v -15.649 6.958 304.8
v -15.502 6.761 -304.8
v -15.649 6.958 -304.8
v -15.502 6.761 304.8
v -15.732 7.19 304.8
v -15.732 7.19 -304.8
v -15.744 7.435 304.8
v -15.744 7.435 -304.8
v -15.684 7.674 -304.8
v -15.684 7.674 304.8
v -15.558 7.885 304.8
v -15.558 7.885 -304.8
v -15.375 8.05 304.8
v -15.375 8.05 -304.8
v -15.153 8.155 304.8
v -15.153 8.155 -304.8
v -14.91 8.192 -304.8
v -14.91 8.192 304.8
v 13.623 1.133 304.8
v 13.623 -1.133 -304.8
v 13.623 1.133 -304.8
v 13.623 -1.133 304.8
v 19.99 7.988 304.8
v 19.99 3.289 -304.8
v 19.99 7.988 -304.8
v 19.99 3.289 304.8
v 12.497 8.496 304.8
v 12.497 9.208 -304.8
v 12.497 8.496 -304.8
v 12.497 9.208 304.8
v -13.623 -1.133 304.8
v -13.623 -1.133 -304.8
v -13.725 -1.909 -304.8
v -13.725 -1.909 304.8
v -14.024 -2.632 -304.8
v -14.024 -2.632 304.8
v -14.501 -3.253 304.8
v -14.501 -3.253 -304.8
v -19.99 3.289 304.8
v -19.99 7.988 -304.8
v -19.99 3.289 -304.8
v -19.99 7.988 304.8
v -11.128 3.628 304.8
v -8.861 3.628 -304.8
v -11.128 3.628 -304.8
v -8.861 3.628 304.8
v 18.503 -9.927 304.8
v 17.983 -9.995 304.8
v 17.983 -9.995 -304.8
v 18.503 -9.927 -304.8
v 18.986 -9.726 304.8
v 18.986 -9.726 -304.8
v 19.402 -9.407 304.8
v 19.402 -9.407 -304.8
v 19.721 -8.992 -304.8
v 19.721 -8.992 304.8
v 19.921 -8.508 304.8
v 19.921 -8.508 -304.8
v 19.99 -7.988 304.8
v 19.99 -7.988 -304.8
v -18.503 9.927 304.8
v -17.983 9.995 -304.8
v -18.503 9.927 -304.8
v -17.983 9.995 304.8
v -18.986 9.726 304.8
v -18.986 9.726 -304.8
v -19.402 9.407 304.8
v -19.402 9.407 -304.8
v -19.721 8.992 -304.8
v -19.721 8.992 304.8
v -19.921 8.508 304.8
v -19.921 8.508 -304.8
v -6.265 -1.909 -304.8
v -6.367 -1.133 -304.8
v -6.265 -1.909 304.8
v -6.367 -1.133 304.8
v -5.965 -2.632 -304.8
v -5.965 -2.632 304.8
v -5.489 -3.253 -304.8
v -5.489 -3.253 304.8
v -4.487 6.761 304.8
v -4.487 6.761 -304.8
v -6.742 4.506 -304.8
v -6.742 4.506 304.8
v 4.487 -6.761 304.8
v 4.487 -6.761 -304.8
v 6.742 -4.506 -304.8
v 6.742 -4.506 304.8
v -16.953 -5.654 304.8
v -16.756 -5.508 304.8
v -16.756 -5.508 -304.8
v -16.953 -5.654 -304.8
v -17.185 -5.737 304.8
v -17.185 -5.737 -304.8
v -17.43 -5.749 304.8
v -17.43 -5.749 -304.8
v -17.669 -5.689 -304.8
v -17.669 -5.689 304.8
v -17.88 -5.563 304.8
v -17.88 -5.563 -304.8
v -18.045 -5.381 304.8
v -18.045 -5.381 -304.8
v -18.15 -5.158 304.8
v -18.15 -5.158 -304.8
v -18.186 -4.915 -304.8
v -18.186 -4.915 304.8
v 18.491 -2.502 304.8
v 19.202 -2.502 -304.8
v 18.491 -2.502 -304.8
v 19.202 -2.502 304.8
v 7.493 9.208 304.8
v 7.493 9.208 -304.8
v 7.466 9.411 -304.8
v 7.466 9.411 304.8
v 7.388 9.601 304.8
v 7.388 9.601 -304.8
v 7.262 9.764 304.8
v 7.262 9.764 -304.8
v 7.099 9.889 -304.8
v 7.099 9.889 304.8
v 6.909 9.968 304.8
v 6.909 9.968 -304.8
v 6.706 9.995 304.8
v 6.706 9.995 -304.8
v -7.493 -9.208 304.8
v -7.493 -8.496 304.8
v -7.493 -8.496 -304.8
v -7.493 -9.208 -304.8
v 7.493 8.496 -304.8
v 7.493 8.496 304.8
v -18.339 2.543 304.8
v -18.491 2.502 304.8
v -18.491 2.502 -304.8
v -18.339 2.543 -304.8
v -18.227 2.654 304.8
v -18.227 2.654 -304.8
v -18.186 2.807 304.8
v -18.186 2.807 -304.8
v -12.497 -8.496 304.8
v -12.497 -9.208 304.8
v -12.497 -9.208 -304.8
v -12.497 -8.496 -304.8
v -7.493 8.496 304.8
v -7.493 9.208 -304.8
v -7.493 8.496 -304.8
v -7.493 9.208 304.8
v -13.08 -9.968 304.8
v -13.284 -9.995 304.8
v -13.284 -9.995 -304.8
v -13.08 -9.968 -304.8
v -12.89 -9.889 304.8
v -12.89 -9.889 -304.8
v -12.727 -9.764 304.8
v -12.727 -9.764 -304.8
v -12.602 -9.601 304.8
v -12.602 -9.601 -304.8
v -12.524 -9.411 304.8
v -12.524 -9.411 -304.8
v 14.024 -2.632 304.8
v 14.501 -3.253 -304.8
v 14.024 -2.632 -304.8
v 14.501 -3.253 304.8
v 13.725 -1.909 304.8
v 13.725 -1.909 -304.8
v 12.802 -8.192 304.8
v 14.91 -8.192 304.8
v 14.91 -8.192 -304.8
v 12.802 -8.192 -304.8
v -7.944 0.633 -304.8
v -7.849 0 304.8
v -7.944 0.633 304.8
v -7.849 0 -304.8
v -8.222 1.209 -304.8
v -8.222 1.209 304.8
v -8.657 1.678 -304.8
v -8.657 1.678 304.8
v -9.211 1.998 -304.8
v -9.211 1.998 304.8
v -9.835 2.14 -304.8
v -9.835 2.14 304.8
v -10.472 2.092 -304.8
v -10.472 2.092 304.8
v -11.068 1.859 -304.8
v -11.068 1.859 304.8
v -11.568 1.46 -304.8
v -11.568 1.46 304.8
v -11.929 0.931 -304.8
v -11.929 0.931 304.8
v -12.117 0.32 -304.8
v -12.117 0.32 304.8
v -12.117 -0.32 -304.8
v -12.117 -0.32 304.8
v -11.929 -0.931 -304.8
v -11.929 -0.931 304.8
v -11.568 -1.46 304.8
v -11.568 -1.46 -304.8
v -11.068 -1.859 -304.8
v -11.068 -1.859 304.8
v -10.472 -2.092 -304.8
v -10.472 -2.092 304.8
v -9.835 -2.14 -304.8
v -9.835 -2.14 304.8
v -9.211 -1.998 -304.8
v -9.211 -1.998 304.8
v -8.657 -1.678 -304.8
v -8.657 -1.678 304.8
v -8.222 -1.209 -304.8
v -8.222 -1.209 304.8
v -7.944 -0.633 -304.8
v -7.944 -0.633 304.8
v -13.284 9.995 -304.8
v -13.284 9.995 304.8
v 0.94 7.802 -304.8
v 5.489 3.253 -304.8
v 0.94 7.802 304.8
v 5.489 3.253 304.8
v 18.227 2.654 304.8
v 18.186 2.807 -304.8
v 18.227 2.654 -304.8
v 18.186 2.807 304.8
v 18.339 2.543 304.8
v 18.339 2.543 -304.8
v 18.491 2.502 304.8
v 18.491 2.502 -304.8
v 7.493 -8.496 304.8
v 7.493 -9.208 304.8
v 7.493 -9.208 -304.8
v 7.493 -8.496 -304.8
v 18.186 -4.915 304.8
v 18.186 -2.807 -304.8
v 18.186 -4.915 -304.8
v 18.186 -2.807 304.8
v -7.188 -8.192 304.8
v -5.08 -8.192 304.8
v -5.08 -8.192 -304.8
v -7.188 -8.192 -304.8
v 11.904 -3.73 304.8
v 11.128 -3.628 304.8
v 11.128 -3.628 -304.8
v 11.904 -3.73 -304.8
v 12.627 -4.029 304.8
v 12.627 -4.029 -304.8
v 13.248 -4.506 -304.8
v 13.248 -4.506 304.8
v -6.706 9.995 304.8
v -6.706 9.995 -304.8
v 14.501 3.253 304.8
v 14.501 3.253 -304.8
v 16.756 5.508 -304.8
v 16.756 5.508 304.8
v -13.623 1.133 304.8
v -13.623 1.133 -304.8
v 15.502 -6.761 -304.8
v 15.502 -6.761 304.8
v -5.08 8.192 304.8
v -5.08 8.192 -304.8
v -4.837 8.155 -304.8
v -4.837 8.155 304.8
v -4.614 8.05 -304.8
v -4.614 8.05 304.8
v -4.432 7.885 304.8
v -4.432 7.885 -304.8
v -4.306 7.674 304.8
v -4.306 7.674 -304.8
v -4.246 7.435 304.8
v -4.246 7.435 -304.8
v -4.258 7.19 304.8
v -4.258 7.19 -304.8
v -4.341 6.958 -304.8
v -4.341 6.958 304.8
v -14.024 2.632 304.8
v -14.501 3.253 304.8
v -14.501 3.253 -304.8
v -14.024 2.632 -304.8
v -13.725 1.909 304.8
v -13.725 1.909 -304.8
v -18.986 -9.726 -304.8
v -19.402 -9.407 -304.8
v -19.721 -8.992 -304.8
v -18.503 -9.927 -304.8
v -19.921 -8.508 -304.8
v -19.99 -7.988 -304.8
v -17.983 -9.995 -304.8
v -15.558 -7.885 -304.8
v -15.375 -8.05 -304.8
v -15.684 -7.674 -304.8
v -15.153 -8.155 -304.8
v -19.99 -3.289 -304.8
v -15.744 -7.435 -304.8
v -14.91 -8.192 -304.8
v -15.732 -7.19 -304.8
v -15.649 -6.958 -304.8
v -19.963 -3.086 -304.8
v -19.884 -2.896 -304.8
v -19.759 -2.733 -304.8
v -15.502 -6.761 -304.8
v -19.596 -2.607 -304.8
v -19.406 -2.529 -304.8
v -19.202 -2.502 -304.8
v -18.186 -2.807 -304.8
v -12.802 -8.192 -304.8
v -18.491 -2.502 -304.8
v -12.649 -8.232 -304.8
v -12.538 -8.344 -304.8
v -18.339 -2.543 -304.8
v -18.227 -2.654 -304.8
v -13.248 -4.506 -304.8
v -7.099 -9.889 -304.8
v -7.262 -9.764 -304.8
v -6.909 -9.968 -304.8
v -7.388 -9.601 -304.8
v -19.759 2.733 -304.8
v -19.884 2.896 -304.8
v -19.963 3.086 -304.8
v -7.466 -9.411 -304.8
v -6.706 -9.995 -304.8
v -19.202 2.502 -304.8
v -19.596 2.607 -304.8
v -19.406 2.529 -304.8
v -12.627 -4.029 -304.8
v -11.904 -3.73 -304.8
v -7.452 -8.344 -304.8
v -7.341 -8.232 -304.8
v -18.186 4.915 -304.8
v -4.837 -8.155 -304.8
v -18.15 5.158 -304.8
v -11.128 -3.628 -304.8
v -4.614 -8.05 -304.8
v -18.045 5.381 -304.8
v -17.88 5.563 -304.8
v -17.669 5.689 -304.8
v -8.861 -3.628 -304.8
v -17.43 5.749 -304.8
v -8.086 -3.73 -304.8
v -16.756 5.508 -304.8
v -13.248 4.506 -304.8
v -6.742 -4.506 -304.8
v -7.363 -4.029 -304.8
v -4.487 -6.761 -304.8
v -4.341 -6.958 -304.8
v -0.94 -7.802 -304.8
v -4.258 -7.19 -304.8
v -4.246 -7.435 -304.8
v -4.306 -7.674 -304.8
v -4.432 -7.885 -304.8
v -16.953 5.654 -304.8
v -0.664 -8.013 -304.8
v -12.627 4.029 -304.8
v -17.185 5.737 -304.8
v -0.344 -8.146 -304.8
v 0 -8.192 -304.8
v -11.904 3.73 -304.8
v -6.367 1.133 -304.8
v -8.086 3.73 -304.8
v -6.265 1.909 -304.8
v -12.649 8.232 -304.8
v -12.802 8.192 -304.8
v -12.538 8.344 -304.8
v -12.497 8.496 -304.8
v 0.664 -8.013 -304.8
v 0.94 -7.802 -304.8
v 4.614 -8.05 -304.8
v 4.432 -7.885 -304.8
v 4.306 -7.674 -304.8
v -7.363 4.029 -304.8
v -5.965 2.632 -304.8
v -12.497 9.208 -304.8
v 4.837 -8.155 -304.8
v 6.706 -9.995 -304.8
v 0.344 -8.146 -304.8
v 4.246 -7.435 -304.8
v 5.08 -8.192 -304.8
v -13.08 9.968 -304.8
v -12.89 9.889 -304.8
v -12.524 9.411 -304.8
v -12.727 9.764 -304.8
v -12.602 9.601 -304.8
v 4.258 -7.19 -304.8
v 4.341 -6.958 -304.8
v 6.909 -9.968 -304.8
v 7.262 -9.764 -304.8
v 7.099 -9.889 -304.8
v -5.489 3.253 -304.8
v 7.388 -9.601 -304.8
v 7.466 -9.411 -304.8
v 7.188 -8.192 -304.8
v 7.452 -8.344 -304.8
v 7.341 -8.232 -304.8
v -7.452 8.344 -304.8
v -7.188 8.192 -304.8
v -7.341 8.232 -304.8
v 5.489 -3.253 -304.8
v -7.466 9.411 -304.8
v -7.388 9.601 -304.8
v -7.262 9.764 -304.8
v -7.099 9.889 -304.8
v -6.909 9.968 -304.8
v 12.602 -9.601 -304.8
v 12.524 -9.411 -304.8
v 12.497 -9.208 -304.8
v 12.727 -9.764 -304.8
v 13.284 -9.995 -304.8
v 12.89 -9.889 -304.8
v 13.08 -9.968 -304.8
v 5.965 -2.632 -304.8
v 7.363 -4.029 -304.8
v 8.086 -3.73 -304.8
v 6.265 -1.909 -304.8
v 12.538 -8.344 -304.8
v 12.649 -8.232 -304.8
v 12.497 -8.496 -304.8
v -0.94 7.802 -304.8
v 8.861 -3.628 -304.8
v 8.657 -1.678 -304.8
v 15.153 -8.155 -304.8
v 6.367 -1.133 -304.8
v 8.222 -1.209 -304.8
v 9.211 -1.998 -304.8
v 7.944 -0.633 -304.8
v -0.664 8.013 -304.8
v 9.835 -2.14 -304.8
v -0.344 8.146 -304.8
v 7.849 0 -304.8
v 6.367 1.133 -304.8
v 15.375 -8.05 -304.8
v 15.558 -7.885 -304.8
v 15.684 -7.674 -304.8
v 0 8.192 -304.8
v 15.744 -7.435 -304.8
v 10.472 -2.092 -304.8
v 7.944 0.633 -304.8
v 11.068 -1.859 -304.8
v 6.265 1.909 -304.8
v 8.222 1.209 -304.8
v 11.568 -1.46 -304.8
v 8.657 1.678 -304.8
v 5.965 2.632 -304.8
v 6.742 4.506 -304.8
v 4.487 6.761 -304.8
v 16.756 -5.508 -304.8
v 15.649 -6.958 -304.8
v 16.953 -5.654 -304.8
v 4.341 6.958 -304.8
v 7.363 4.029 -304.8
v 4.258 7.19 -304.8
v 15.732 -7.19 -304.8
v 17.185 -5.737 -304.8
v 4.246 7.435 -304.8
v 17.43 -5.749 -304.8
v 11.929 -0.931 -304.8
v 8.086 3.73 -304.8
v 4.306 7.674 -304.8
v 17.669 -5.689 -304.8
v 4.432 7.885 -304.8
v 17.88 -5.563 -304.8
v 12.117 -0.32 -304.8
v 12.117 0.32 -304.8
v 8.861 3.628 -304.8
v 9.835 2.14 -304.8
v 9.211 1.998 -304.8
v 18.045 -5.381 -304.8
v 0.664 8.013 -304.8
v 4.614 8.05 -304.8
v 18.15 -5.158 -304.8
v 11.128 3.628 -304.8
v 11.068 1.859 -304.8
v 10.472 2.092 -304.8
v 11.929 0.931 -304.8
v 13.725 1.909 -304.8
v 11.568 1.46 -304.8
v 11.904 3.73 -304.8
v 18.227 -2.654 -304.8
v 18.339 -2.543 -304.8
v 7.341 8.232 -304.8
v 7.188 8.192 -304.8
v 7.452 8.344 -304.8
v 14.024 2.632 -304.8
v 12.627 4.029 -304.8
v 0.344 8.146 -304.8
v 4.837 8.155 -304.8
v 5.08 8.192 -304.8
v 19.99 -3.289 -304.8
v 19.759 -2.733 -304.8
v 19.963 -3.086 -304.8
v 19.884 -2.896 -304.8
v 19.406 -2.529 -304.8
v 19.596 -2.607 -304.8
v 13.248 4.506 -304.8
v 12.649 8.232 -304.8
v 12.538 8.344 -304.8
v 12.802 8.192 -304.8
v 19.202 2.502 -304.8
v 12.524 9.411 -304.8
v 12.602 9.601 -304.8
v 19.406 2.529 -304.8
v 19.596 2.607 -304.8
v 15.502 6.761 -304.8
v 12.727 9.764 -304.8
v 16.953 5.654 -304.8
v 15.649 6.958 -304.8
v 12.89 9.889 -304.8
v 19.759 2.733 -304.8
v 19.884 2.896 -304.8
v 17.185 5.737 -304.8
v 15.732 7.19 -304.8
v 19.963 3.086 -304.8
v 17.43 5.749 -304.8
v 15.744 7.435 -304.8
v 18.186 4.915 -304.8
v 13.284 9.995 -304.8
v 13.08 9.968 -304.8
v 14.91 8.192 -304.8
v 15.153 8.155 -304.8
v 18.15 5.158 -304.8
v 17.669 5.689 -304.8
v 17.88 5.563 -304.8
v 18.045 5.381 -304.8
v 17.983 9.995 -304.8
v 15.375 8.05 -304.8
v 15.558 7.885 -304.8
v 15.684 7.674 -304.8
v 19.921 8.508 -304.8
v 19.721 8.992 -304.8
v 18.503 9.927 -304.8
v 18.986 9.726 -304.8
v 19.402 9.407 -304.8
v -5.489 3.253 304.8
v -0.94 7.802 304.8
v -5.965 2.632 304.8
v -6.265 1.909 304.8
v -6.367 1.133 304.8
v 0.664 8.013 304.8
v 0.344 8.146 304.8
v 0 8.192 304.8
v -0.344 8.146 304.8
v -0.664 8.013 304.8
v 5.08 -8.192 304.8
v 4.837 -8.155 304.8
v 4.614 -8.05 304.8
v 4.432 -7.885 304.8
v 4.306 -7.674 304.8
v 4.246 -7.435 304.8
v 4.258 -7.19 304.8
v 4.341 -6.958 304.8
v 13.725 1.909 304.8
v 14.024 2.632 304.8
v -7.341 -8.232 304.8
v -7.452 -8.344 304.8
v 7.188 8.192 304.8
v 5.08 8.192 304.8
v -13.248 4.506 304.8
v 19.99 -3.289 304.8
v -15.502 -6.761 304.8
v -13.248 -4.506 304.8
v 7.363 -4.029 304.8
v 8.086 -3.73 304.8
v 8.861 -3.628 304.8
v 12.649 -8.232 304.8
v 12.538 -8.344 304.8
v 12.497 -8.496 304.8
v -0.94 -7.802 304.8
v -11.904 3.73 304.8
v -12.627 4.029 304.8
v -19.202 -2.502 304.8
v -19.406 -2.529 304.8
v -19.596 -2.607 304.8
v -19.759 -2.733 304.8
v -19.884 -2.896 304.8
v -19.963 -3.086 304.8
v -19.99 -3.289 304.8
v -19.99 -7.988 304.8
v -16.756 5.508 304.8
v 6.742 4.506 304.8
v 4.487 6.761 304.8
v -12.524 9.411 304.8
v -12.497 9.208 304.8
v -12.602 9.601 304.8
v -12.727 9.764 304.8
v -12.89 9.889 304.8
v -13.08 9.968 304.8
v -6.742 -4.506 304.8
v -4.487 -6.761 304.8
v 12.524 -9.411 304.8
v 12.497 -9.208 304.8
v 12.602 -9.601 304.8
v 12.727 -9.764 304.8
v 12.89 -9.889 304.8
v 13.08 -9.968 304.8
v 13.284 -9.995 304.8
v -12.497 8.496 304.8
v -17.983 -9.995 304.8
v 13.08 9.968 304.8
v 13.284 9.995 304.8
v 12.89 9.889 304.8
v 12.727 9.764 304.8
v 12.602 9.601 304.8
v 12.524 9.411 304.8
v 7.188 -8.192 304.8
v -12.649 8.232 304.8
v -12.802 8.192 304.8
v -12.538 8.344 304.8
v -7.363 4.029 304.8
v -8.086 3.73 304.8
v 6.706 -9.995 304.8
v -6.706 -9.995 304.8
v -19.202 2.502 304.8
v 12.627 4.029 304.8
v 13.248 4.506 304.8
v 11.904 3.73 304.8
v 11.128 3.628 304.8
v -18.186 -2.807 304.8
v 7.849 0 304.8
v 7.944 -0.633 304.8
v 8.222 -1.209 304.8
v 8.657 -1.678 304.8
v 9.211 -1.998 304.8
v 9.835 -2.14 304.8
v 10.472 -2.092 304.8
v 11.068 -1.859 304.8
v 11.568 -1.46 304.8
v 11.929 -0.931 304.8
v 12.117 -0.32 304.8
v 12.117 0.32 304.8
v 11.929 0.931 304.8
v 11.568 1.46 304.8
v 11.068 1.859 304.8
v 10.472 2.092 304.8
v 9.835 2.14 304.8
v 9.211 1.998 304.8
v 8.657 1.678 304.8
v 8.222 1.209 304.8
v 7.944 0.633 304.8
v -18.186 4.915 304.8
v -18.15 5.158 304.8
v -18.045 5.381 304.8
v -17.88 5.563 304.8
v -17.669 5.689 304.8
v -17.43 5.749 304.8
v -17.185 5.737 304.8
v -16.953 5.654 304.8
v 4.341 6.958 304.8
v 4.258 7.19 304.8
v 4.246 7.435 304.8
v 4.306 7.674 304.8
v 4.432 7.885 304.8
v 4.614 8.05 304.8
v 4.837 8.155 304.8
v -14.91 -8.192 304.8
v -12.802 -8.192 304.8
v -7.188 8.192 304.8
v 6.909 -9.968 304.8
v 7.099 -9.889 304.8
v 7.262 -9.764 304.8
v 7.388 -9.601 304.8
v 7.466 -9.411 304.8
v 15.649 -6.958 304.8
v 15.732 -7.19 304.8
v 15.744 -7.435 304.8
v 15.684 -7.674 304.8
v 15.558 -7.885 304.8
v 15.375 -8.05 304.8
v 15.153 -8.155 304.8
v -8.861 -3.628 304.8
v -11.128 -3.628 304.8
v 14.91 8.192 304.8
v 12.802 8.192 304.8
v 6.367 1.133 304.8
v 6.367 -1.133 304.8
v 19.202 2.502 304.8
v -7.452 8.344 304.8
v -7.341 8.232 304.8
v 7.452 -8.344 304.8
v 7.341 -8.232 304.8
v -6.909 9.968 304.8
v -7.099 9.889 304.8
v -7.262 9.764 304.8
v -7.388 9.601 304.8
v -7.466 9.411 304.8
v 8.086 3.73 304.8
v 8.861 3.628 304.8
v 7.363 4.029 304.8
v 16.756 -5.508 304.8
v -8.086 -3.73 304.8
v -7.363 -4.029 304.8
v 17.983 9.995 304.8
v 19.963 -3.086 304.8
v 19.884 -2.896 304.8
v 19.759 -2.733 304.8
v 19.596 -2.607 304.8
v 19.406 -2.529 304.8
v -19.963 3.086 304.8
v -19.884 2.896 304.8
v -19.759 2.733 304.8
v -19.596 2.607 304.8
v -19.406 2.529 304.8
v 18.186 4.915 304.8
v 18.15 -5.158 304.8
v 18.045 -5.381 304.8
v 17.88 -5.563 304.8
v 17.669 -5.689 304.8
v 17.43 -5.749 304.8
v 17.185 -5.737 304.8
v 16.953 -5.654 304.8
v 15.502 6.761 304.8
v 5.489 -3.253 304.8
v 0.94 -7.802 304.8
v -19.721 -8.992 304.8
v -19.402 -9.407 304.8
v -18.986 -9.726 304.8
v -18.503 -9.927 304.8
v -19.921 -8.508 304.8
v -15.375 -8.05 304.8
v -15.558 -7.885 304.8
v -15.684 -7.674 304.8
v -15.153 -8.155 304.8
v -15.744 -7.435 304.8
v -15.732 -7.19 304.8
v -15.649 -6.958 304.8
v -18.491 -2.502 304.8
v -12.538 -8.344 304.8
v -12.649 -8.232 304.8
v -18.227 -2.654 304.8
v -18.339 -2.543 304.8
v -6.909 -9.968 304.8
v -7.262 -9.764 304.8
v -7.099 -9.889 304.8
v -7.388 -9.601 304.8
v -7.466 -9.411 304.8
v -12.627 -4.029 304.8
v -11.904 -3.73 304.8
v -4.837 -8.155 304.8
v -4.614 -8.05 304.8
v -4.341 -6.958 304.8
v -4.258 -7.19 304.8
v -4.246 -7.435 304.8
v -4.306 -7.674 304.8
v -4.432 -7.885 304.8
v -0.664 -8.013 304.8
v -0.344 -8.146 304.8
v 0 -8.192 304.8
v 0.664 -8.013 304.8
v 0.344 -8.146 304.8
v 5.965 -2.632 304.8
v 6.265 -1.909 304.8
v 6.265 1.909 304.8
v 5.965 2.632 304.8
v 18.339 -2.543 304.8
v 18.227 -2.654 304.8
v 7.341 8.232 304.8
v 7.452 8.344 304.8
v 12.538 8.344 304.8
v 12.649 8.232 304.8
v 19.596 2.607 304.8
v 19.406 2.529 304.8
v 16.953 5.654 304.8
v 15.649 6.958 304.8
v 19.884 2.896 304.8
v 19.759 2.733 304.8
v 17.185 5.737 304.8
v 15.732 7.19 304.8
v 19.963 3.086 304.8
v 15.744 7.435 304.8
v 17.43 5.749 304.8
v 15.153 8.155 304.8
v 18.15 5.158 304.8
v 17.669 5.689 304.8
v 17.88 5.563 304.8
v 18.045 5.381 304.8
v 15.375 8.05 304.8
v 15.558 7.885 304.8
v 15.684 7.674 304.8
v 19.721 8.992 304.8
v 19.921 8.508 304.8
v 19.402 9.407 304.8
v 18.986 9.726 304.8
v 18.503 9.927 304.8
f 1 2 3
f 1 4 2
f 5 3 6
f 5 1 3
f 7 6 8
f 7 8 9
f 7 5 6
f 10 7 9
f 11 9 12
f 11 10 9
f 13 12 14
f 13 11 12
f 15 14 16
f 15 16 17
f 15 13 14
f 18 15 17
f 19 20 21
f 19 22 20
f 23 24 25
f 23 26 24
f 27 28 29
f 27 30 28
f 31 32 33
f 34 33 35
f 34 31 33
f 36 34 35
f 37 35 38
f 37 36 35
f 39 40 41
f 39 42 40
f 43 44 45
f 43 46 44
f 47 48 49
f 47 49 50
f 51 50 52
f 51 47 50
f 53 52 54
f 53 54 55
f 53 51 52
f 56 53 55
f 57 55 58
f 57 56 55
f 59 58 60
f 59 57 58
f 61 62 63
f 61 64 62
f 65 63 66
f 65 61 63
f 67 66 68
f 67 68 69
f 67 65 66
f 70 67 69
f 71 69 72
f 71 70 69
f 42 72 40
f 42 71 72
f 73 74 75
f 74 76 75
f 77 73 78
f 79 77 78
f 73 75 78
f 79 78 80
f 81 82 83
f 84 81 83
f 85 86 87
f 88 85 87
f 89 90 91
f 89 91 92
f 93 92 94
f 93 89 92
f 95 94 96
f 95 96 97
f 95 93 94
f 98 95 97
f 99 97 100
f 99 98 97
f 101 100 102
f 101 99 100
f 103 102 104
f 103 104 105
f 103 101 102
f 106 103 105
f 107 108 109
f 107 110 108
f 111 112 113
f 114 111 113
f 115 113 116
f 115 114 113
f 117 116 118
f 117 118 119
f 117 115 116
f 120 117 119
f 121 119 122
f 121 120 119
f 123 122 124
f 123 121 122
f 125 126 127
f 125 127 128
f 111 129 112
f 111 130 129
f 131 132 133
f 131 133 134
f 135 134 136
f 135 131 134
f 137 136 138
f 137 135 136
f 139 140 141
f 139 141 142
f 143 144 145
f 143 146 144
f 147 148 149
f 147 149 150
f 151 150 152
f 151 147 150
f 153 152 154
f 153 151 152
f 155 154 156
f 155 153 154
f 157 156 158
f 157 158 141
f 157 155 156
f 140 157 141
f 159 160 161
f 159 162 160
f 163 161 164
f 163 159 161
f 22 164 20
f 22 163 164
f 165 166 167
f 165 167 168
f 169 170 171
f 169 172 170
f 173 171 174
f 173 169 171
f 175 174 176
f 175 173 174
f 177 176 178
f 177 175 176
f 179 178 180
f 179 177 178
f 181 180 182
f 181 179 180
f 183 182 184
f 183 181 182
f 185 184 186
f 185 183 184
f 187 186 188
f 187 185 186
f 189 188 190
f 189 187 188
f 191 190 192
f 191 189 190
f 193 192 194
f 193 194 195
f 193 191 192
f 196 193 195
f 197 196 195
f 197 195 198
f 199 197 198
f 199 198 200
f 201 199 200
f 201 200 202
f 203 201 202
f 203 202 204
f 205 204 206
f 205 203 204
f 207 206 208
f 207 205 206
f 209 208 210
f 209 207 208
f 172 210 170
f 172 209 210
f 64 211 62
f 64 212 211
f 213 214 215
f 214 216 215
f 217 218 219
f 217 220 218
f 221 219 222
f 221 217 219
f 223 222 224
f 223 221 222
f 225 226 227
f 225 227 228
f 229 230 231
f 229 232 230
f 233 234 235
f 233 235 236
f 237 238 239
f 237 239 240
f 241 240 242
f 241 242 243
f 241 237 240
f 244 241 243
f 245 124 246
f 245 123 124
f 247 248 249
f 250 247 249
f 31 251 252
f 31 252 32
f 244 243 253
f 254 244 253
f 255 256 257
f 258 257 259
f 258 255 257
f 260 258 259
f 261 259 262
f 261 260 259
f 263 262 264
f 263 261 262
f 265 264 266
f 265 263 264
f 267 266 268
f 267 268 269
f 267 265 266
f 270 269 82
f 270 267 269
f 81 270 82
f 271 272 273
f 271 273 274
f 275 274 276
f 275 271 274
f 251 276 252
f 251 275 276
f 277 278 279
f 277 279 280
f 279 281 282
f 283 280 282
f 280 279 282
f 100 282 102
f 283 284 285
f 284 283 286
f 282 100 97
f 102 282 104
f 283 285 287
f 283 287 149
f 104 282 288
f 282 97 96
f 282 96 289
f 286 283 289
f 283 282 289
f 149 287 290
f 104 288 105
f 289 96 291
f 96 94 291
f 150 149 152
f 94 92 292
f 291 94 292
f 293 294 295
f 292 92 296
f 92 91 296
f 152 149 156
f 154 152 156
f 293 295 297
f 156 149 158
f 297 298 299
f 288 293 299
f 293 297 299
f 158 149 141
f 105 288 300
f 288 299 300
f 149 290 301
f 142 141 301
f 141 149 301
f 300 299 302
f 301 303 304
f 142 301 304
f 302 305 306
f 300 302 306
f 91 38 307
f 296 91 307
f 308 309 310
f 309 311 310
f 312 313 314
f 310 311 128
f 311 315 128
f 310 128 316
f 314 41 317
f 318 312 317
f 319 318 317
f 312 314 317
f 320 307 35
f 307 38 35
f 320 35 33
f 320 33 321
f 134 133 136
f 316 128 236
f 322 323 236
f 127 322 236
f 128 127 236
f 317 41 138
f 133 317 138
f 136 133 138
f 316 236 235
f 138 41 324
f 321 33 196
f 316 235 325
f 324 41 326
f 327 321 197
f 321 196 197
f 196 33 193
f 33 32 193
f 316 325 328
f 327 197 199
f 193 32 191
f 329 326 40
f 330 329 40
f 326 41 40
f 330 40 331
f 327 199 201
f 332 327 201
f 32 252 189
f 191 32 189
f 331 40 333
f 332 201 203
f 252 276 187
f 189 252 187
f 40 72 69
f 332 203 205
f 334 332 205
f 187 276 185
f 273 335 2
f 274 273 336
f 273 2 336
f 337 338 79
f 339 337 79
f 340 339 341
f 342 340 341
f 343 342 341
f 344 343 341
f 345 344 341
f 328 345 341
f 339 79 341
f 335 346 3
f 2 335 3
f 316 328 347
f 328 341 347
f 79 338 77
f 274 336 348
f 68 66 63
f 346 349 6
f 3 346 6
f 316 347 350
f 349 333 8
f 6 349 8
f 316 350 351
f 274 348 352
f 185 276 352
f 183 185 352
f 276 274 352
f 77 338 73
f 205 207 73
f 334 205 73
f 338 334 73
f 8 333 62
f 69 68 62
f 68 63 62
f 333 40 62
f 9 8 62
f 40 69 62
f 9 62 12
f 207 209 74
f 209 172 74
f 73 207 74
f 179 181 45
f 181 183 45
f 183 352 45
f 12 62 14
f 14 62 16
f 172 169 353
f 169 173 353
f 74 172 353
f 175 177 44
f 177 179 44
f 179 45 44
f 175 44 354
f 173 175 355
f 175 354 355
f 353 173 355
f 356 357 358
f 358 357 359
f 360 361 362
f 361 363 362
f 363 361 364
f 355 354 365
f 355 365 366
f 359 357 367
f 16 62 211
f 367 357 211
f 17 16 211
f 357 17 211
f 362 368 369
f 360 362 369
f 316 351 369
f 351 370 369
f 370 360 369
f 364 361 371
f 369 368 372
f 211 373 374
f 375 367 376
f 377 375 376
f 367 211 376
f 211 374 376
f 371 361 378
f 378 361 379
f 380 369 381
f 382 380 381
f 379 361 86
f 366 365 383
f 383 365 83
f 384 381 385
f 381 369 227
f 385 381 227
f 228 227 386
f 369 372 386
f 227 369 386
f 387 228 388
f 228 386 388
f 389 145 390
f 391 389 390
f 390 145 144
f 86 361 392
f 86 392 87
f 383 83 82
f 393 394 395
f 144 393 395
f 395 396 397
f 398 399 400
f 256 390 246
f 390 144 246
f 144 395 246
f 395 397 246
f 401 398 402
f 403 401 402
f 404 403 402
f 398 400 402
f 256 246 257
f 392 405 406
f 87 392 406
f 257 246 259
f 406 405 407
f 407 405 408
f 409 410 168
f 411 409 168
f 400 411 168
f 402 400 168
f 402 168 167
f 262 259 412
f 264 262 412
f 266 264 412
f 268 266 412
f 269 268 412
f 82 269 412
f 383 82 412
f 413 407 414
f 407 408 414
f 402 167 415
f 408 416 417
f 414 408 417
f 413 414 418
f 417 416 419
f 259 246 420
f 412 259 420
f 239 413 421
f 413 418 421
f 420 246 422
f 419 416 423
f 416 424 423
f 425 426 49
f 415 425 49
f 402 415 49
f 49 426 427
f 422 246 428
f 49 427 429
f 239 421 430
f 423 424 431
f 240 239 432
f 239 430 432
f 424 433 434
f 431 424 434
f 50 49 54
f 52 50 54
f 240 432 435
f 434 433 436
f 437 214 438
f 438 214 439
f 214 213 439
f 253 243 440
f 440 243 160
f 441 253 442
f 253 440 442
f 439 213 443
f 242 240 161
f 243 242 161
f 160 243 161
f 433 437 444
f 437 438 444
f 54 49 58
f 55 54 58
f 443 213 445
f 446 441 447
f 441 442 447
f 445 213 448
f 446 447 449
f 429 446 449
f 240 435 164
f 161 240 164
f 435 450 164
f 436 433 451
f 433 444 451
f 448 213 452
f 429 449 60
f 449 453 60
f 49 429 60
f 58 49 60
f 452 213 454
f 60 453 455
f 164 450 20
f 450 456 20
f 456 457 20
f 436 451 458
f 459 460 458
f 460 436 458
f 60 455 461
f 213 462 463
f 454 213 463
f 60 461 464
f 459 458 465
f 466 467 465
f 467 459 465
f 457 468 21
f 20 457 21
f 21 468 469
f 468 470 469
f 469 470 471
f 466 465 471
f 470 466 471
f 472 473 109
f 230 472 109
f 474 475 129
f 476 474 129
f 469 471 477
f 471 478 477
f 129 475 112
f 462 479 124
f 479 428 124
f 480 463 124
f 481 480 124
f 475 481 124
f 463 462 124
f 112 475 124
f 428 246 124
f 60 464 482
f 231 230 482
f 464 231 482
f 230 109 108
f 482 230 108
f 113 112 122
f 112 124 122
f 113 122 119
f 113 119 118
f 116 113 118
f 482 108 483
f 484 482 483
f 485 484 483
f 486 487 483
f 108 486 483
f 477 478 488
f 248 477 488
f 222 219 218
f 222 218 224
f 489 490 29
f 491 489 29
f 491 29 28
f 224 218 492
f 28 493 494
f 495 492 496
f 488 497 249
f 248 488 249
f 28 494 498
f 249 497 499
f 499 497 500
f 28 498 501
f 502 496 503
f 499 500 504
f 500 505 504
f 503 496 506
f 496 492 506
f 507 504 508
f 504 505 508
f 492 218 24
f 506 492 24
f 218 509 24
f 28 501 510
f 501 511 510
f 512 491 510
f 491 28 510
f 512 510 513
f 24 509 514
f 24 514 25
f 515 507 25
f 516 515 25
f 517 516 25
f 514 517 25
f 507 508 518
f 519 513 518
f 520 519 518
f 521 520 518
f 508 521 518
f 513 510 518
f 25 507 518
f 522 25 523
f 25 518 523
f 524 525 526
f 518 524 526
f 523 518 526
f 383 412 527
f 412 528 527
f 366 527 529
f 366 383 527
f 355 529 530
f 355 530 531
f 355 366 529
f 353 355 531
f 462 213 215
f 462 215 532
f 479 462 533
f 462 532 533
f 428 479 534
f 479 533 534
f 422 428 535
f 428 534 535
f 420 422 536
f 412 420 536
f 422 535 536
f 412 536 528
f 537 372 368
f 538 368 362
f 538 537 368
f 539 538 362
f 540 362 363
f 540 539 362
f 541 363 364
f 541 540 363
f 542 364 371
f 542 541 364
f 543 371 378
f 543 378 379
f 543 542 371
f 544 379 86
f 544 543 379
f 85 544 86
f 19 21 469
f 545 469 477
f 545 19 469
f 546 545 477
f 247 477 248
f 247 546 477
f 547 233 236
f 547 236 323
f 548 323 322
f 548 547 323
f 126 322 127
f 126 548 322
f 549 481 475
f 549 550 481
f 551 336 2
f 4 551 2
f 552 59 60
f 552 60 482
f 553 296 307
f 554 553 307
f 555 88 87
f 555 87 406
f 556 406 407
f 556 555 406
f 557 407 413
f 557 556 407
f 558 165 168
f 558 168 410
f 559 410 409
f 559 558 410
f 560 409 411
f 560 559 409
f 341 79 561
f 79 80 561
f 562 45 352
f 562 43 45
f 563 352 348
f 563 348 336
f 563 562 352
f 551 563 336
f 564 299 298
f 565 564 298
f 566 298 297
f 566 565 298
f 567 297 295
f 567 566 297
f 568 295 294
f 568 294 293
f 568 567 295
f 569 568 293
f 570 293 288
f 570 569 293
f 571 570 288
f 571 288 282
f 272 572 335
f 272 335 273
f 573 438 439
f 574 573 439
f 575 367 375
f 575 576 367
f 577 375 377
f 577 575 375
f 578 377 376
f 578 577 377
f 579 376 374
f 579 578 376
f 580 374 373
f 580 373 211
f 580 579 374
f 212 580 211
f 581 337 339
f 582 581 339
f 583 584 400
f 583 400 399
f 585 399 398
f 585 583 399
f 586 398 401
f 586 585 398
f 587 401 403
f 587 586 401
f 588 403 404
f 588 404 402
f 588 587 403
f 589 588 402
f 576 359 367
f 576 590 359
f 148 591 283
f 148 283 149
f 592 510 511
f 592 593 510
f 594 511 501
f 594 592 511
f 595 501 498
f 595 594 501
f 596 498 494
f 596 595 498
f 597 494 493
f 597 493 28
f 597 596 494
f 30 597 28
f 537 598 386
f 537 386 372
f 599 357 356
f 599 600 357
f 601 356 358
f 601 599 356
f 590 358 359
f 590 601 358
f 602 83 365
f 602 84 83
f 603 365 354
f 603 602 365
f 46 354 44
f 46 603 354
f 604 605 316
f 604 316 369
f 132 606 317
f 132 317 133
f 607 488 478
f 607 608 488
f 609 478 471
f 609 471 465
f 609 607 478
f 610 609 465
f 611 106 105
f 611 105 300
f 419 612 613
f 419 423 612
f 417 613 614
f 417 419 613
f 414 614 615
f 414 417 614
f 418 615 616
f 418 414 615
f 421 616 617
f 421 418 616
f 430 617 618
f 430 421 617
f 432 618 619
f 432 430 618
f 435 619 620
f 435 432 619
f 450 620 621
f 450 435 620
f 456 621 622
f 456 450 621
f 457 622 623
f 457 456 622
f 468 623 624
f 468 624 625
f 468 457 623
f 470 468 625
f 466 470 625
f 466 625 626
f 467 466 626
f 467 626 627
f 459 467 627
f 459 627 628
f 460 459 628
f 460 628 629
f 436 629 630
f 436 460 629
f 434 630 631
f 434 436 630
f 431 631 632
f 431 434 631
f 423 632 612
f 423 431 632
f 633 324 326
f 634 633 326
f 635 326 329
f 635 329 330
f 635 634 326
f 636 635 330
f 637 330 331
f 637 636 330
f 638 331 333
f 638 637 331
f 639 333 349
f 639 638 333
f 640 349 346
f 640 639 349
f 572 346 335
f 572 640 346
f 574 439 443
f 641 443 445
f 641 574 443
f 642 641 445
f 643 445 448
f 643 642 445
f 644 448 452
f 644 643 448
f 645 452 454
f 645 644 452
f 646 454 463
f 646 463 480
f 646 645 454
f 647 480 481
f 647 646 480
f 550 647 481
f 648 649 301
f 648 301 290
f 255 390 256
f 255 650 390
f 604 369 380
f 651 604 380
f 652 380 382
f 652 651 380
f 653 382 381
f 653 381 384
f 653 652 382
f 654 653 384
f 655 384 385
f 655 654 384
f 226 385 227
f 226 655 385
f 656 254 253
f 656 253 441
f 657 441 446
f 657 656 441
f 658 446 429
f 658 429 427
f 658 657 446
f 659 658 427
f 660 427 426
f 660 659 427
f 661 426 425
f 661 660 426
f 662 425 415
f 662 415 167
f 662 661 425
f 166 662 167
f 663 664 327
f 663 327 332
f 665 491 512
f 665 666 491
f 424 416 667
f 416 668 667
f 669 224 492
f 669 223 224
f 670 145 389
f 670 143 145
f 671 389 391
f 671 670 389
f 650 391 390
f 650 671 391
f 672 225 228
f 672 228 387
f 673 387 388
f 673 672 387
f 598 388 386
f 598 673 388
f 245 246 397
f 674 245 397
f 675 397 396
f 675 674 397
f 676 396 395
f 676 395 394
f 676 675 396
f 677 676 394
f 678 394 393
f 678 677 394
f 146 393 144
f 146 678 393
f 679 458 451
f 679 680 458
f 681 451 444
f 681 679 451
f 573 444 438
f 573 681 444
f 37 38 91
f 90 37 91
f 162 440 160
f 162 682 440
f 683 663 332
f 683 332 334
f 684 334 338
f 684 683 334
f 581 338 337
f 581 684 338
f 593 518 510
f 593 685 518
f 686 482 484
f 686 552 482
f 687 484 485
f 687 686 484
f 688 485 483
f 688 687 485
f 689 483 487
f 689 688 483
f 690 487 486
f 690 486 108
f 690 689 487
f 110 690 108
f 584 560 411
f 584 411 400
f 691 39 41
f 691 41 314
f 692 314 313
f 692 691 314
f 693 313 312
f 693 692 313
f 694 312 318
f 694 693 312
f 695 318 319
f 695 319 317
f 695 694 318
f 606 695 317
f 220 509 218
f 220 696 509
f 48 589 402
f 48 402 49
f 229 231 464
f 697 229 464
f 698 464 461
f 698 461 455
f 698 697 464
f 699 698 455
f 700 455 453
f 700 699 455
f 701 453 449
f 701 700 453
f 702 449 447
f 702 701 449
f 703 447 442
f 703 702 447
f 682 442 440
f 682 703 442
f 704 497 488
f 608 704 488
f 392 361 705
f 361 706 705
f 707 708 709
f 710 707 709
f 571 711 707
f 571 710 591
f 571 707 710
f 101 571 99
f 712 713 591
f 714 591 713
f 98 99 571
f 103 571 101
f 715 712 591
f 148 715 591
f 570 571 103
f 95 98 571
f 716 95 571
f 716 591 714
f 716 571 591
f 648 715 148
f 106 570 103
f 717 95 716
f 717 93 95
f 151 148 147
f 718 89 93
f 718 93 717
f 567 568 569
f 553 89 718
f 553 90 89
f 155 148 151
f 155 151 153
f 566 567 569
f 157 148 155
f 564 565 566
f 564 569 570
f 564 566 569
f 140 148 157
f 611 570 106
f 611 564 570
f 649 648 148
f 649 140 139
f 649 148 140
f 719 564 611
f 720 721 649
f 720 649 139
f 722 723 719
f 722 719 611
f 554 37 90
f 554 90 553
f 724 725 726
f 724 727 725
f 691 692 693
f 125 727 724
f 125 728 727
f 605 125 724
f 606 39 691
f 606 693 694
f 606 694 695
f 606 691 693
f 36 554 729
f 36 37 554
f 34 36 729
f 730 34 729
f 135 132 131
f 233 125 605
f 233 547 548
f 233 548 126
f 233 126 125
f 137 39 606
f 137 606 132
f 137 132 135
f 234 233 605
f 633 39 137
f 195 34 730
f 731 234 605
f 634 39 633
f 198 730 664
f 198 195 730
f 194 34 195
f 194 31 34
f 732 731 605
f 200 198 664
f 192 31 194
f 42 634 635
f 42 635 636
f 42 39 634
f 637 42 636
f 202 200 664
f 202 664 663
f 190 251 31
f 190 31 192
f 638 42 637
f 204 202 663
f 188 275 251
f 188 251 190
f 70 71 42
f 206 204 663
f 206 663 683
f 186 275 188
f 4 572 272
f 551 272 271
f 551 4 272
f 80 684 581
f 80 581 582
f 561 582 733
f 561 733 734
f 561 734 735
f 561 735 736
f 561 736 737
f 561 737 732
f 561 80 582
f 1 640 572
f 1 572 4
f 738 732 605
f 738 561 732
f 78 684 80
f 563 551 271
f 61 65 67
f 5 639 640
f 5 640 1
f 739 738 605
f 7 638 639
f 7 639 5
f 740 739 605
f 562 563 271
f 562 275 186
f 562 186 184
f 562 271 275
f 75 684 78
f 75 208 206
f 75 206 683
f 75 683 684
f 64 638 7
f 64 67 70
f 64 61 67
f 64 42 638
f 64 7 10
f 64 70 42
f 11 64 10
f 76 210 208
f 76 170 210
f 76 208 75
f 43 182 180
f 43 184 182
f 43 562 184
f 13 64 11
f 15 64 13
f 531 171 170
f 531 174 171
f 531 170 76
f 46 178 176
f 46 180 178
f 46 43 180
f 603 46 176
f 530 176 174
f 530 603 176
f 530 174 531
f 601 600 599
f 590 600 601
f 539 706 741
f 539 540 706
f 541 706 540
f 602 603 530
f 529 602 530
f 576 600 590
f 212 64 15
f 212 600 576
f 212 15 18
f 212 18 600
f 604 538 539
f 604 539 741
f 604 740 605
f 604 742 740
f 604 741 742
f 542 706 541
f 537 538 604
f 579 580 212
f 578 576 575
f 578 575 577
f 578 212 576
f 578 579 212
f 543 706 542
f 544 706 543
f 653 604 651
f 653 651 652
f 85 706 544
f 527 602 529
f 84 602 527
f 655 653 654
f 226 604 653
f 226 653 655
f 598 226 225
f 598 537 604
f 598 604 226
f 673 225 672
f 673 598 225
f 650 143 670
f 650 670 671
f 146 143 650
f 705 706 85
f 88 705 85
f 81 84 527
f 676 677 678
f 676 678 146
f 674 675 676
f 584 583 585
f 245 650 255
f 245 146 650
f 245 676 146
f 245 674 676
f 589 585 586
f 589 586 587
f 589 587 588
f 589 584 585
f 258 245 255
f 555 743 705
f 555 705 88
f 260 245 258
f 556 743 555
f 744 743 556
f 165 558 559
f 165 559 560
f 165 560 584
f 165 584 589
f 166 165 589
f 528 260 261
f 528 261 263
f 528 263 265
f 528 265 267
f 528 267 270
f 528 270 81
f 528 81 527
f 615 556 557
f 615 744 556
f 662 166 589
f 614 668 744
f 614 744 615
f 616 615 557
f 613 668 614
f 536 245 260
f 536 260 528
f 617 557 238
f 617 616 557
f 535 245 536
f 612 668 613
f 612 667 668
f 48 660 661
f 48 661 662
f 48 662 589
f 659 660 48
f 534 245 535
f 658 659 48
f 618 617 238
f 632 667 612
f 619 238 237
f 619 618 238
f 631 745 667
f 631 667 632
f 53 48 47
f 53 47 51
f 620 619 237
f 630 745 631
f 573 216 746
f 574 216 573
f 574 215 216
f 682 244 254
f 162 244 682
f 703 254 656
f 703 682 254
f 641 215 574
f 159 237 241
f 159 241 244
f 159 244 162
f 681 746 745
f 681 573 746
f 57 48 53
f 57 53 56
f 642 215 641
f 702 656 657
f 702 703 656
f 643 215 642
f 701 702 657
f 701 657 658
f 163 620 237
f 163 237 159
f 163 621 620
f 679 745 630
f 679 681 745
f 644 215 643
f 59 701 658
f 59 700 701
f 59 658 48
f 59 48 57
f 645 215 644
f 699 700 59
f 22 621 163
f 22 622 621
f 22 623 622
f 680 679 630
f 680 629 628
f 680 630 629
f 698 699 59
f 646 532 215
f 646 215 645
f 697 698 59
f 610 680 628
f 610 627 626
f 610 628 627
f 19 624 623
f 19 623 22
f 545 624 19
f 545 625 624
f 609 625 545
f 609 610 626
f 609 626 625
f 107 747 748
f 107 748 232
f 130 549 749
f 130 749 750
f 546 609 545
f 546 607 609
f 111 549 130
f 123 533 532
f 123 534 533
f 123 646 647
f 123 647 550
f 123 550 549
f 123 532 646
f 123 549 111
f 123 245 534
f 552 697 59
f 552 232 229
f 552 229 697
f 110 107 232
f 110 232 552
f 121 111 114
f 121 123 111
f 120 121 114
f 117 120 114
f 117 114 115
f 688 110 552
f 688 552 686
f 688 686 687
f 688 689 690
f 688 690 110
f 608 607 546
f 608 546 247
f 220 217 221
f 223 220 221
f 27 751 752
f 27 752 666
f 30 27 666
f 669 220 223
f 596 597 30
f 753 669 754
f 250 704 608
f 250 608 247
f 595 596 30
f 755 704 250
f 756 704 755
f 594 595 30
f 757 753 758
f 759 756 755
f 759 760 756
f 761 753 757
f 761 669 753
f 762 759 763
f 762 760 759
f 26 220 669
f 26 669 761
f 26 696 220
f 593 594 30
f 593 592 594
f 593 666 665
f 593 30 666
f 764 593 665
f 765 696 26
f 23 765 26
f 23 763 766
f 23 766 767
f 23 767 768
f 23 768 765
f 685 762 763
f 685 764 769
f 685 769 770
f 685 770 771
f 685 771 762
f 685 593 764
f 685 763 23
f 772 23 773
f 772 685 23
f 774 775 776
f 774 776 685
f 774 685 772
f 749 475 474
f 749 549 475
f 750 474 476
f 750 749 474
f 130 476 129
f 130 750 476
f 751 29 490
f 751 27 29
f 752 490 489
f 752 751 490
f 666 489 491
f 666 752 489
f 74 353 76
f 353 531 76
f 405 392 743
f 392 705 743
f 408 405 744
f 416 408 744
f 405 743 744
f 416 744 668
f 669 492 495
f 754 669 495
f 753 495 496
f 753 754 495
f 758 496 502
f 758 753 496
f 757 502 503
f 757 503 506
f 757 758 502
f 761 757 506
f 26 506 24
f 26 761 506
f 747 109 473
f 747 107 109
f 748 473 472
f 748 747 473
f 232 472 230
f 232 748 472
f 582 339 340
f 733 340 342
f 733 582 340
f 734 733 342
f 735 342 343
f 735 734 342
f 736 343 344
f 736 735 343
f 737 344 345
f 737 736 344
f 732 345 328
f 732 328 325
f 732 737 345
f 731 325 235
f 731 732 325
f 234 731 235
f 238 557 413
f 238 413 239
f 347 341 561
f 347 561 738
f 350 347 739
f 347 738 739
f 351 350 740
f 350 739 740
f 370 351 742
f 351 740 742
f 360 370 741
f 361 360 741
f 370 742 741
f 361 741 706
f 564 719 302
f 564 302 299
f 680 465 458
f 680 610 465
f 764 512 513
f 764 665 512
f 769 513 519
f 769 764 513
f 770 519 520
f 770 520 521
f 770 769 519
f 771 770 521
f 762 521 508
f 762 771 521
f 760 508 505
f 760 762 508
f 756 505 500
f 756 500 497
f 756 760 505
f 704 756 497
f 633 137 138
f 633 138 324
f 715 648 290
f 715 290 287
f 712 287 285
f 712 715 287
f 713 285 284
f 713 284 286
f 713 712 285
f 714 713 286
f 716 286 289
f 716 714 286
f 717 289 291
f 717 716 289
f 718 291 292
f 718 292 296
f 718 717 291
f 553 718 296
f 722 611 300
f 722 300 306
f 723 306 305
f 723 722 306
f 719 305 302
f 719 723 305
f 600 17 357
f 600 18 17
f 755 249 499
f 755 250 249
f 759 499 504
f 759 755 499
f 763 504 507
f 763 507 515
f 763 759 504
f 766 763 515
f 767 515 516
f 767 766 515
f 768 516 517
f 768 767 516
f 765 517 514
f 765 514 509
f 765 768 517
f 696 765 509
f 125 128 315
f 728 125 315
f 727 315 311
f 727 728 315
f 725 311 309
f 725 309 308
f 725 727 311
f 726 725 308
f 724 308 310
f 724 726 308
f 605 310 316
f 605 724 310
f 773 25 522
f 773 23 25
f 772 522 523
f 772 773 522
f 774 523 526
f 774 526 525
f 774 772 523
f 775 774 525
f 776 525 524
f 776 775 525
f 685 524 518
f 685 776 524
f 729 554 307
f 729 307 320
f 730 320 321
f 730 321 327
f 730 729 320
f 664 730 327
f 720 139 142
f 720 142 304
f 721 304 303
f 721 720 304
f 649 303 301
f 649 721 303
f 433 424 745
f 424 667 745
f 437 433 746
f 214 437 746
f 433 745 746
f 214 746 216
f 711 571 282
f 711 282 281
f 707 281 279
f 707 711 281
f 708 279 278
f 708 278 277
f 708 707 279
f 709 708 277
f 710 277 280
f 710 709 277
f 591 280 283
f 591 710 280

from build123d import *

# Parameters (mm, degrees)
SKETCH1_R           = 2.1463
BOSS_EXTRUDE1_DEPTH = 304.8


with BuildPart() as part:
    # Sketch1 → Boss-Extrude1 (new, symmetric)
    with BuildSketch(Plane.XY):
        with BuildLine():
            Line((-19.9898, 7.9883), (-19.9898, 3.2893))
            ThreePointArc((-19.9898, 3.2893), (-19.75917588, 2.73252412), (-19.2024, 2.5019))
            Line((-19.2024, 2.5019), (-18.4912, 2.5019))
            ThreePointArc((-18.4912, 2.5019), (-18.275673853, 2.591173853), (-18.1864, 2.8067))
            Line((-18.1864, 2.8067), (-18.1864, 4.9149))
            ThreePointArc((-18.1864, 4.9149), (-17.668965253, 5.689295824), (-16.755503096, 5.507596904))
            Line((-16.755503096, 5.507596904), (-14.500665747, 3.252759555))
            ThreePointArc((-14.500665747, 3.252759555), (-13.850954457, 2.280397894), (-13.622806192, 1.133419111))
            Line((-13.622806192, 1.133419111), (-13.622806192, -1.133419111))
            ThreePointArc((-13.622806192, -1.133419111), (-13.850954457, -2.280397894), (-14.500665747, -3.252759555))
            Line((-14.500665747, -3.252759555), (-16.755503096, -5.507596904))
            ThreePointArc((-16.755503096, -5.507596904), (-17.668965253, -5.689295824), (-18.1864, -4.9149))
            Line((-18.1864, -4.9149), (-18.1864, -2.8067))
            ThreePointArc((-18.1864, -2.8067), (-18.275673853, -2.591173853), (-18.4912, -2.5019))
            Line((-18.4912, -2.5019), (-19.2024, -2.5019))
            ThreePointArc((-19.2024, -2.5019), (-19.75917588, -2.73252412), (-19.9898, -3.2893))
            Line((-19.9898, -3.2893), (-19.9898, -7.9883))
            ThreePointArc((-19.9898, -7.9883), (-19.402080467, -9.407180467), (-17.9832, -9.9949))
            Line((-17.9832, -9.9949), (-13.2842, -9.9949))
            ThreePointArc((-13.2842, -9.9949), (-12.72742412, -9.76427588), (-12.4968, -9.2075))
            Line((-12.4968, -9.2075), (-12.4968, -8.4963))
            ThreePointArc((-12.4968, -8.4963), (-12.586073853, -8.280773853), (-12.8016, -8.1915))
            Line((-12.8016, -8.1915), (-14.9098, -8.1915))
            ThreePointArc((-14.9098, -8.1915), (-15.684195824, -7.674065253), (-15.502496904, -6.760603096))
            Line((-15.502496904, -6.760603096), (-13.247659555, -4.505765747))
            ThreePointArc((-13.247659555, -4.505765747), (-12.275297894, -3.856054457), (-11.128319111, -3.627906192))
            Line((-11.128319111, -3.627906192), (-8.861480889, -3.627906192))
            ThreePointArc((-8.861480889, -3.627906192), (-7.714502106, -3.856054457), (-6.742140445, -4.505765747))
            Line((-6.742140445, -4.505765747), (-4.487303096, -6.760603096))
            ThreePointArc((-4.487303096, -6.760603096), (-4.305604176, -7.674065253), (-5.08, -8.1915))
            Line((-5.08, -8.1915), (-7.1882, -8.1915))
            ThreePointArc((-7.1882, -8.1915), (-7.403726147, -8.280773853), (-7.493, -8.4963))
            Line((-7.493, -8.4963), (-7.493, -9.2075))
            ThreePointArc((-7.493, -9.2075), (-7.26237588, -9.76427588), (-6.7056, -9.9949))
            Line((-6.7056, -9.9949), (0, -9.9949))
            Line((0, -9.9949), (6.7056, -9.9949))
            ThreePointArc((6.7056, -9.9949), (7.26237588, -9.76427588), (7.493, -9.2075))
            Line((7.493, -9.2075), (7.493, -8.4963))
            ThreePointArc((7.493, -8.4963), (7.403726147, -8.280773853), (7.1882, -8.1915))
            Line((7.1882, -8.1915), (5.08, -8.1915))
            ThreePointArc((5.08, -8.1915), (4.305604176, -7.674065253), (4.487303096, -6.760603096))
            Line((4.487303096, -6.760603096), (6.742140445, -4.505765747))
            ThreePointArc((6.742140445, -4.505765747), (7.714502106, -3.856054457), (8.861480889, -3.627906192))
            Line((8.861480889, -3.627906192), (11.128319111, -3.627906192))
            ThreePointArc((11.128319111, -3.627906192), (12.275297894, -3.856054457), (13.247659555, -4.505765747))
            Line((13.247659555, -4.505765747), (15.502496904, -6.760603096))
            ThreePointArc((15.502496904, -6.760603096), (15.684195824, -7.674065253), (14.9098, -8.1915))
            Line((14.9098, -8.1915), (12.8016, -8.1915))
            ThreePointArc((12.8016, -8.1915), (12.586073853, -8.280773853), (12.4968, -8.4963))
            Line((12.4968, -8.4963), (12.4968, -9.2075))
            ThreePointArc((12.4968, -9.2075), (12.72742412, -9.76427588), (13.2842, -9.9949))
            Line((13.2842, -9.9949), (17.9832, -9.9949))
            ThreePointArc((17.9832, -9.9949), (19.402080467, -9.407180467), (19.9898, -7.9883))
            Line((19.9898, -7.9883), (19.9898, -3.2893))
            ThreePointArc((19.9898, -3.2893), (19.75917588, -2.73252412), (19.2024, -2.5019))
            Line((19.2024, -2.5019), (18.4912, -2.5019))
            ThreePointArc((18.4912, -2.5019), (18.275673853, -2.591173853), (18.1864, -2.8067))
            Line((18.1864, -2.8067), (18.1864, -4.9149))
            ThreePointArc((18.1864, -4.9149), (17.668965253, -5.689295824), (16.755503096, -5.507596904))
            Line((16.755503096, -5.507596904), (14.500665747, -3.252759555))
            ThreePointArc((14.500665747, -3.252759555), (13.850954457, -2.280397894), (13.622806192, -1.133419111))
            Line((13.622806192, -1.133419111), (13.622806192, 1.133419111))
            ThreePointArc((13.622806192, 1.133419111), (13.850954457, 2.280397894), (14.500665747, 3.252759555))
            Line((14.500665747, 3.252759555), (16.755503096, 5.507596904))
            ThreePointArc((16.755503096, 5.507596904), (17.668965253, 5.689295824), (18.1864, 4.9149))
            Line((18.1864, 4.9149), (18.1864, 2.8067))
            ThreePointArc((18.1864, 2.8067), (18.275673853, 2.591173853), (18.4912, 2.5019))
            Line((18.4912, 2.5019), (19.2024, 2.5019))
            ThreePointArc((19.2024, 2.5019), (19.75917588, 2.73252412), (19.9898, 3.2893))
            Line((19.9898, 3.2893), (19.9898, 7.9883))
            ThreePointArc((19.9898, 7.9883), (19.402080467, 9.407180467), (17.9832, 9.9949))
            Line((17.9832, 9.9949), (13.2842, 9.9949))
            ThreePointArc((13.2842, 9.9949), (12.72742412, 9.76427588), (12.4968, 9.2075))
            Line((12.4968, 9.2075), (12.4968, 8.4963))
            ThreePointArc((12.4968, 8.4963), (12.586073853, 8.280773853), (12.8016, 8.1915))
            Line((12.8016, 8.1915), (14.9098, 8.1915))
            ThreePointArc((14.9098, 8.1915), (15.684195824, 7.674065253), (15.502496904, 6.760603096))
            Line((15.502496904, 6.760603096), (13.247659555, 4.505765747))
            ThreePointArc((13.247659555, 4.505765747), (12.275297894, 3.856054457), (11.128319111, 3.627906192))
            Line((11.128319111, 3.627906192), (8.861480889, 3.627906192))
            ThreePointArc((8.861480889, 3.627906192), (7.714502106, 3.856054457), (6.742140445, 4.505765747))
            Line((6.742140445, 4.505765747), (4.487303096, 6.760603096))
            ThreePointArc((4.487303096, 6.760603096), (4.305604176, 7.674065253), (5.08, 8.1915))
            Line((5.08, 8.1915), (7.1882, 8.1915))
            ThreePointArc((7.1882, 8.1915), (7.403726147, 8.280773853), (7.493, 8.4963))
            Line((7.493, 8.4963), (7.493, 9.2075))
            ThreePointArc((7.493, 9.2075), (7.26237588, 9.76427588), (6.7056, 9.9949))
            Line((6.7056, 9.9949), (0, 9.9949))
            Line((0, 9.9949), (-6.7056, 9.9949))
            ThreePointArc((-6.7056, 9.9949), (-7.26237588, 9.76427588), (-7.493, 9.2075))
            Line((-7.493, 9.2075), (-7.493, 8.4963))
            ThreePointArc((-7.493, 8.4963), (-7.403726147, 8.280773853), (-7.1882, 8.1915))
            Line((-7.1882, 8.1915), (-5.08, 8.1915))
            ThreePointArc((-5.08, 8.1915), (-4.305604176, 7.674065253), (-4.487303096, 6.760603096))
            Line((-4.487303096, 6.760603096), (-6.742140445, 4.505765747))
            ThreePointArc((-6.742140445, 4.505765747), (-7.714502106, 3.856054457), (-8.861480889, 3.627906192))
            Line((-8.861480889, 3.627906192), (-11.128319111, 3.627906192))
            ThreePointArc((-11.128319111, 3.627906192), (-12.275297894, 3.856054457), (-13.247659555, 4.505765747))
            Line((-13.247659555, 4.505765747), (-15.502496904, 6.760603096))
            ThreePointArc((-15.502496904, 6.760603096), (-15.684195824, 7.674065253), (-14.9098, 8.1915))
            Line((-14.9098, 8.1915), (-12.8016, 8.1915))
            ThreePointArc((-12.8016, 8.1915), (-12.586073853, 8.280773853), (-12.4968, 8.4963))
            Line((-12.4968, 8.4963), (-12.4968, 9.2075))
            ThreePointArc((-12.4968, 9.2075), (-12.72742412, 9.76427588), (-13.2842, 9.9949))
            Line((-13.2842, 9.9949), (-17.9832, 9.9949))
            ThreePointArc((-17.9832, 9.9949), (-19.402080467, 9.407180467), (-19.9898, 7.9883))
        make_face()
        with Locations((-9.9949, 0)):
            Circle(SKETCH1_R, mode=Mode.SUBTRACT)
        with Locations(Location((9.9949, 0, 0), (0, 0, 180))):
            Circle(SKETCH1_R, mode=Mode.SUBTRACT)
        with BuildLine():
            Line((-6.366993808, 1.133419111), (-6.366993808, -1.133419111))
            ThreePointArc((-6.366993808, -1.133419111), (-6.138845543, -2.280397894), (-5.489134253, -3.252759555))
            Line((-5.489134253, -3.252759555), (-0.939581002, -7.802312806))
            ThreePointArc((-0.939581002, -7.802312806), (0, -8.1915), (0.939581002, -7.802312806))
            Line((0.939581002, -7.802312806), (5.489134253, -3.252759555))
            ThreePointArc((5.489134253, -3.252759555), (6.138845543, -2.280397894), (6.366993808, -1.133419111))
            Line((6.366993808, -1.133419111), (6.366993808, 1.133419111))
            ThreePointArc((6.366993808, 1.133419111), (6.138845543, 2.280397894), (5.489134253, 3.252759555))
            Line((5.489134253, 3.252759555), (0.939581002, 7.802312806))
            ThreePointArc((0.939581002, 7.802312806), (0, 8.1915), (-0.939581002, 7.802312806))
            Line((-0.939581002, 7.802312806), (-5.489134253, 3.252759555))
            ThreePointArc((-5.489134253, 3.252759555), (-6.138845543, 2.280397894), (-6.366993808, 1.133419111))
        make_face(mode=Mode.SUBTRACT)
    extrude(amount=BOSS_EXTRUDE1_DEPTH, both=True)


solid = part.part
